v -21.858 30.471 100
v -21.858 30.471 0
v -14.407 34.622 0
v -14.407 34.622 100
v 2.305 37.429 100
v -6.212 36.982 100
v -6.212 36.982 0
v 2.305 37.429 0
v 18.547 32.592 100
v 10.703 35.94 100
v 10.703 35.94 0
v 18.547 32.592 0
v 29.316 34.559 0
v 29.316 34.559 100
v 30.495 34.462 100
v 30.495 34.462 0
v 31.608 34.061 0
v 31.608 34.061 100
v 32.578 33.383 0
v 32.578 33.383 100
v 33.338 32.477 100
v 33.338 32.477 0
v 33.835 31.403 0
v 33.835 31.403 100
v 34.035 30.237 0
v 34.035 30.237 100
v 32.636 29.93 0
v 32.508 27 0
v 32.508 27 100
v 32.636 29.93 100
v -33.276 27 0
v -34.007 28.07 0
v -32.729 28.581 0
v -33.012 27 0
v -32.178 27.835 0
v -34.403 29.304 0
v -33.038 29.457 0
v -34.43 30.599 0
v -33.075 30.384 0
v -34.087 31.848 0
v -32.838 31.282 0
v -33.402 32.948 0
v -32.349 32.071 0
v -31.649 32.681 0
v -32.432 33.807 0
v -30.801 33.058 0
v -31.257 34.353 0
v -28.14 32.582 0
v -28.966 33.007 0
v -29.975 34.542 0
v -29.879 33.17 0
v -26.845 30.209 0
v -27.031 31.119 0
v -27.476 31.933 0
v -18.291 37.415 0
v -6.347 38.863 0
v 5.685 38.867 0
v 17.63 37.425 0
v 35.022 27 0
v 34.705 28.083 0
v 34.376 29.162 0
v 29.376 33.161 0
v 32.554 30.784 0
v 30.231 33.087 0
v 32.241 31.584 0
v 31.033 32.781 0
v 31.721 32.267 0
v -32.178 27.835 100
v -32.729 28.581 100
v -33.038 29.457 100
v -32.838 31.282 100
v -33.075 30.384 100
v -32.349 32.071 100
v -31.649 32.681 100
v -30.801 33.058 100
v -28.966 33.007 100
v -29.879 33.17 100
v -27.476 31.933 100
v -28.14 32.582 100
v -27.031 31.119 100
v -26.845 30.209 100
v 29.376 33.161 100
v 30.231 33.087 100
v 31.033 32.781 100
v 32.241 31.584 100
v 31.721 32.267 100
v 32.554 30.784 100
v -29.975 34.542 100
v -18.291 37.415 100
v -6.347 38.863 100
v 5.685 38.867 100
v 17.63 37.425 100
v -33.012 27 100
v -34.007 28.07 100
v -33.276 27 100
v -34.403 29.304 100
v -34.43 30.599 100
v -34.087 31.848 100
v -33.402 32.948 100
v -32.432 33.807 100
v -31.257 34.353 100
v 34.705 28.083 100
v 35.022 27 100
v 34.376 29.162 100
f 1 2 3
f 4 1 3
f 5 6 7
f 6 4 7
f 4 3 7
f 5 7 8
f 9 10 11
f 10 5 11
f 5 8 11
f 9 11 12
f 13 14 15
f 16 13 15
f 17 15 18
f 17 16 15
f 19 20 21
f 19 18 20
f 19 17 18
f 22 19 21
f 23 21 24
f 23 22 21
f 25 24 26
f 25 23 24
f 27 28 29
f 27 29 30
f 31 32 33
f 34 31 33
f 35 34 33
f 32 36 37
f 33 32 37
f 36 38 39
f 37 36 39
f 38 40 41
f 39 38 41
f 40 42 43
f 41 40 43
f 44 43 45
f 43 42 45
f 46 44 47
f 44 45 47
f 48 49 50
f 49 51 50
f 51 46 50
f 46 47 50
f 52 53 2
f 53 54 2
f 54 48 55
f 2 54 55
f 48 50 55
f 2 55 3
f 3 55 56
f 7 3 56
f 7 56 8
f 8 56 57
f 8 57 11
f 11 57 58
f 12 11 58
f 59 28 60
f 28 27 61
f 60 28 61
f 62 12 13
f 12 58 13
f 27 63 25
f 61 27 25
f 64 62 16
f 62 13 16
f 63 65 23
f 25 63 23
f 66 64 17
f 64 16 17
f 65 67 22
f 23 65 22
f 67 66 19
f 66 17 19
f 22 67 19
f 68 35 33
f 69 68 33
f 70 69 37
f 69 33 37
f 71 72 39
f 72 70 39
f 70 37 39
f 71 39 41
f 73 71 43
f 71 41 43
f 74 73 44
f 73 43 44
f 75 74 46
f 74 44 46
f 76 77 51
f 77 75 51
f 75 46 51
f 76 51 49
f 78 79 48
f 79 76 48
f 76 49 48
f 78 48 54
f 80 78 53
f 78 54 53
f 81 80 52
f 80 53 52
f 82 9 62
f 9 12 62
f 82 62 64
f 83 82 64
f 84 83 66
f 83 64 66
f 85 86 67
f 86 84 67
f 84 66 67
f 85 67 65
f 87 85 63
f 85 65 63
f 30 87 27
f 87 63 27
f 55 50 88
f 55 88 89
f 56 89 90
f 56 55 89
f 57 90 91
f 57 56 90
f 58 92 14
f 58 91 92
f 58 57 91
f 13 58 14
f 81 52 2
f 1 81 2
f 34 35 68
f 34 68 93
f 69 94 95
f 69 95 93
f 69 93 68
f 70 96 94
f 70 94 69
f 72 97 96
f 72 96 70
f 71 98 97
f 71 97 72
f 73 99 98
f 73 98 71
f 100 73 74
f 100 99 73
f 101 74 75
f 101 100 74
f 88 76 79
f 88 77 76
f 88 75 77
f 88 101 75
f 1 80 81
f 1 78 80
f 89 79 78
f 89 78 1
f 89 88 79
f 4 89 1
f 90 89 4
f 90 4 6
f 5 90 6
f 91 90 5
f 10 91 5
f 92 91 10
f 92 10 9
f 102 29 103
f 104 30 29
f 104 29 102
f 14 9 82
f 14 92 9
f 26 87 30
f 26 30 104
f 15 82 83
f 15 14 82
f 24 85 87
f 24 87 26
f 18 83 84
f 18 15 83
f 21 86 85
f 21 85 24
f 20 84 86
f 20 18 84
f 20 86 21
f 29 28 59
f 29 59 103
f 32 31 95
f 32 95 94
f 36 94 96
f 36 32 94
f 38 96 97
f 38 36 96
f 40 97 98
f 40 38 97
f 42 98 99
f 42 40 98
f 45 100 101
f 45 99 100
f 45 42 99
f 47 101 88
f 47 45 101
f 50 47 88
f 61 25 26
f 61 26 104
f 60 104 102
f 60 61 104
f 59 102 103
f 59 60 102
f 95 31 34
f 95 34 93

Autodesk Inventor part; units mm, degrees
ref_plane "YZ Plane" through (0, 0, 0) normal (1, 0, 0) x (0, 1, 0)
ref_plane "XY Plane" through (0, 0, 0) normal (0, 0, 1) x (1, 0, 0)
sketch "Sketch1" plane through (0, 0, 0) normal (0, 0, 1) x (1, 0, 0)
  arc A0 (32.6355, 29.9298) -> (29.3759, 33.1607) centre (29.5384, 30.0649) ccw
  arc A1 (27.8274, -32.2191) -> (30.1546, -26.93) centre (30.0194, -30.0271) ccw
  arc A2 (32.4933, 26.671) -> (34.0351, 30.2371) centre (29.5384, 30.0649) ccw
  arc A3 (26.8375, -33.2091) -> (34.5127, -29.7804) centre (30.0194, -30.0271) ccw
  line L0 (-29.9673, 30.0452) -> (-33.1472, 26.8653)
  line L1 (-29.9673, 30.0452) -> (-25.4702, 30.0452) construction
  line L2 (-29.9673, 30.0452) -> (-21.8579, 30.471)
  line L3 (30.0194, -30.0271) -> (30.3698, -21.9984)
  line L4 (30.0194, -30.0271) -> (26.8375, -33.2091)
  circle A4 centre (0, 0) radius 37.5
  arc A5 (34.5127, -29.7804) -> (34.0351, 30.2371) centre (-61.1139, -0.5306) ccw
  arc A6 (29.3158, 34.5594) -> (-29.9754, 34.5423) centre (-0.3022, -60.9538) ccw
  line L5 (18.5473, 32.5922) -> (29.3759, 33.1607)
  line L6 (32.1704, 19.2696) -> (32.6355, 29.9298)
  arc A7 (29.3158, 34.5594) -> (26.1185, 32.9896) centre (29.5384, 30.0649) ccw
  arc A8 (34.0351, 30.2371) -> (29.3158, 34.5594) centre (29.5384, 30.0649) ccw
  arc A9 (-29.9754, 34.5423) -> (-33.1472, 26.8653) centre (-29.9673, 30.0452) ccw
  arc A10 (-26.8454, 30.2091) -> (-32.1778, 27.8347) centre (-29.9673, 30.0452) ccw
  dimension "d0" = 6.2
  dimension "d1" = 6.2
  dimension "d6" = 9
  dimension "d7" = 9
  dimension "d8" = 135
  dimension "d9" = 75
  dimension "d11" = 100
  dimension "d12" = 100
extrude "Extrusion1" add sketch "Sketch1" along normal blind 100 contours A0 L5 A7 A8 A2 L6 | A2 A5 A3 L4 A1 L3 A4 L6 | L5 A4 L2 A10 L0 A9 A6 A7
ref_plane "Work Plane1" through (0, 27, 0) normal (0, 1, 0) x (-1, 0, 0)
split "Split1" plane through (0, 27, 0) removes the side toward (0, -1, 0)
properties part number "Cage60mm-2sides-InnerD75mm-L100mm"
